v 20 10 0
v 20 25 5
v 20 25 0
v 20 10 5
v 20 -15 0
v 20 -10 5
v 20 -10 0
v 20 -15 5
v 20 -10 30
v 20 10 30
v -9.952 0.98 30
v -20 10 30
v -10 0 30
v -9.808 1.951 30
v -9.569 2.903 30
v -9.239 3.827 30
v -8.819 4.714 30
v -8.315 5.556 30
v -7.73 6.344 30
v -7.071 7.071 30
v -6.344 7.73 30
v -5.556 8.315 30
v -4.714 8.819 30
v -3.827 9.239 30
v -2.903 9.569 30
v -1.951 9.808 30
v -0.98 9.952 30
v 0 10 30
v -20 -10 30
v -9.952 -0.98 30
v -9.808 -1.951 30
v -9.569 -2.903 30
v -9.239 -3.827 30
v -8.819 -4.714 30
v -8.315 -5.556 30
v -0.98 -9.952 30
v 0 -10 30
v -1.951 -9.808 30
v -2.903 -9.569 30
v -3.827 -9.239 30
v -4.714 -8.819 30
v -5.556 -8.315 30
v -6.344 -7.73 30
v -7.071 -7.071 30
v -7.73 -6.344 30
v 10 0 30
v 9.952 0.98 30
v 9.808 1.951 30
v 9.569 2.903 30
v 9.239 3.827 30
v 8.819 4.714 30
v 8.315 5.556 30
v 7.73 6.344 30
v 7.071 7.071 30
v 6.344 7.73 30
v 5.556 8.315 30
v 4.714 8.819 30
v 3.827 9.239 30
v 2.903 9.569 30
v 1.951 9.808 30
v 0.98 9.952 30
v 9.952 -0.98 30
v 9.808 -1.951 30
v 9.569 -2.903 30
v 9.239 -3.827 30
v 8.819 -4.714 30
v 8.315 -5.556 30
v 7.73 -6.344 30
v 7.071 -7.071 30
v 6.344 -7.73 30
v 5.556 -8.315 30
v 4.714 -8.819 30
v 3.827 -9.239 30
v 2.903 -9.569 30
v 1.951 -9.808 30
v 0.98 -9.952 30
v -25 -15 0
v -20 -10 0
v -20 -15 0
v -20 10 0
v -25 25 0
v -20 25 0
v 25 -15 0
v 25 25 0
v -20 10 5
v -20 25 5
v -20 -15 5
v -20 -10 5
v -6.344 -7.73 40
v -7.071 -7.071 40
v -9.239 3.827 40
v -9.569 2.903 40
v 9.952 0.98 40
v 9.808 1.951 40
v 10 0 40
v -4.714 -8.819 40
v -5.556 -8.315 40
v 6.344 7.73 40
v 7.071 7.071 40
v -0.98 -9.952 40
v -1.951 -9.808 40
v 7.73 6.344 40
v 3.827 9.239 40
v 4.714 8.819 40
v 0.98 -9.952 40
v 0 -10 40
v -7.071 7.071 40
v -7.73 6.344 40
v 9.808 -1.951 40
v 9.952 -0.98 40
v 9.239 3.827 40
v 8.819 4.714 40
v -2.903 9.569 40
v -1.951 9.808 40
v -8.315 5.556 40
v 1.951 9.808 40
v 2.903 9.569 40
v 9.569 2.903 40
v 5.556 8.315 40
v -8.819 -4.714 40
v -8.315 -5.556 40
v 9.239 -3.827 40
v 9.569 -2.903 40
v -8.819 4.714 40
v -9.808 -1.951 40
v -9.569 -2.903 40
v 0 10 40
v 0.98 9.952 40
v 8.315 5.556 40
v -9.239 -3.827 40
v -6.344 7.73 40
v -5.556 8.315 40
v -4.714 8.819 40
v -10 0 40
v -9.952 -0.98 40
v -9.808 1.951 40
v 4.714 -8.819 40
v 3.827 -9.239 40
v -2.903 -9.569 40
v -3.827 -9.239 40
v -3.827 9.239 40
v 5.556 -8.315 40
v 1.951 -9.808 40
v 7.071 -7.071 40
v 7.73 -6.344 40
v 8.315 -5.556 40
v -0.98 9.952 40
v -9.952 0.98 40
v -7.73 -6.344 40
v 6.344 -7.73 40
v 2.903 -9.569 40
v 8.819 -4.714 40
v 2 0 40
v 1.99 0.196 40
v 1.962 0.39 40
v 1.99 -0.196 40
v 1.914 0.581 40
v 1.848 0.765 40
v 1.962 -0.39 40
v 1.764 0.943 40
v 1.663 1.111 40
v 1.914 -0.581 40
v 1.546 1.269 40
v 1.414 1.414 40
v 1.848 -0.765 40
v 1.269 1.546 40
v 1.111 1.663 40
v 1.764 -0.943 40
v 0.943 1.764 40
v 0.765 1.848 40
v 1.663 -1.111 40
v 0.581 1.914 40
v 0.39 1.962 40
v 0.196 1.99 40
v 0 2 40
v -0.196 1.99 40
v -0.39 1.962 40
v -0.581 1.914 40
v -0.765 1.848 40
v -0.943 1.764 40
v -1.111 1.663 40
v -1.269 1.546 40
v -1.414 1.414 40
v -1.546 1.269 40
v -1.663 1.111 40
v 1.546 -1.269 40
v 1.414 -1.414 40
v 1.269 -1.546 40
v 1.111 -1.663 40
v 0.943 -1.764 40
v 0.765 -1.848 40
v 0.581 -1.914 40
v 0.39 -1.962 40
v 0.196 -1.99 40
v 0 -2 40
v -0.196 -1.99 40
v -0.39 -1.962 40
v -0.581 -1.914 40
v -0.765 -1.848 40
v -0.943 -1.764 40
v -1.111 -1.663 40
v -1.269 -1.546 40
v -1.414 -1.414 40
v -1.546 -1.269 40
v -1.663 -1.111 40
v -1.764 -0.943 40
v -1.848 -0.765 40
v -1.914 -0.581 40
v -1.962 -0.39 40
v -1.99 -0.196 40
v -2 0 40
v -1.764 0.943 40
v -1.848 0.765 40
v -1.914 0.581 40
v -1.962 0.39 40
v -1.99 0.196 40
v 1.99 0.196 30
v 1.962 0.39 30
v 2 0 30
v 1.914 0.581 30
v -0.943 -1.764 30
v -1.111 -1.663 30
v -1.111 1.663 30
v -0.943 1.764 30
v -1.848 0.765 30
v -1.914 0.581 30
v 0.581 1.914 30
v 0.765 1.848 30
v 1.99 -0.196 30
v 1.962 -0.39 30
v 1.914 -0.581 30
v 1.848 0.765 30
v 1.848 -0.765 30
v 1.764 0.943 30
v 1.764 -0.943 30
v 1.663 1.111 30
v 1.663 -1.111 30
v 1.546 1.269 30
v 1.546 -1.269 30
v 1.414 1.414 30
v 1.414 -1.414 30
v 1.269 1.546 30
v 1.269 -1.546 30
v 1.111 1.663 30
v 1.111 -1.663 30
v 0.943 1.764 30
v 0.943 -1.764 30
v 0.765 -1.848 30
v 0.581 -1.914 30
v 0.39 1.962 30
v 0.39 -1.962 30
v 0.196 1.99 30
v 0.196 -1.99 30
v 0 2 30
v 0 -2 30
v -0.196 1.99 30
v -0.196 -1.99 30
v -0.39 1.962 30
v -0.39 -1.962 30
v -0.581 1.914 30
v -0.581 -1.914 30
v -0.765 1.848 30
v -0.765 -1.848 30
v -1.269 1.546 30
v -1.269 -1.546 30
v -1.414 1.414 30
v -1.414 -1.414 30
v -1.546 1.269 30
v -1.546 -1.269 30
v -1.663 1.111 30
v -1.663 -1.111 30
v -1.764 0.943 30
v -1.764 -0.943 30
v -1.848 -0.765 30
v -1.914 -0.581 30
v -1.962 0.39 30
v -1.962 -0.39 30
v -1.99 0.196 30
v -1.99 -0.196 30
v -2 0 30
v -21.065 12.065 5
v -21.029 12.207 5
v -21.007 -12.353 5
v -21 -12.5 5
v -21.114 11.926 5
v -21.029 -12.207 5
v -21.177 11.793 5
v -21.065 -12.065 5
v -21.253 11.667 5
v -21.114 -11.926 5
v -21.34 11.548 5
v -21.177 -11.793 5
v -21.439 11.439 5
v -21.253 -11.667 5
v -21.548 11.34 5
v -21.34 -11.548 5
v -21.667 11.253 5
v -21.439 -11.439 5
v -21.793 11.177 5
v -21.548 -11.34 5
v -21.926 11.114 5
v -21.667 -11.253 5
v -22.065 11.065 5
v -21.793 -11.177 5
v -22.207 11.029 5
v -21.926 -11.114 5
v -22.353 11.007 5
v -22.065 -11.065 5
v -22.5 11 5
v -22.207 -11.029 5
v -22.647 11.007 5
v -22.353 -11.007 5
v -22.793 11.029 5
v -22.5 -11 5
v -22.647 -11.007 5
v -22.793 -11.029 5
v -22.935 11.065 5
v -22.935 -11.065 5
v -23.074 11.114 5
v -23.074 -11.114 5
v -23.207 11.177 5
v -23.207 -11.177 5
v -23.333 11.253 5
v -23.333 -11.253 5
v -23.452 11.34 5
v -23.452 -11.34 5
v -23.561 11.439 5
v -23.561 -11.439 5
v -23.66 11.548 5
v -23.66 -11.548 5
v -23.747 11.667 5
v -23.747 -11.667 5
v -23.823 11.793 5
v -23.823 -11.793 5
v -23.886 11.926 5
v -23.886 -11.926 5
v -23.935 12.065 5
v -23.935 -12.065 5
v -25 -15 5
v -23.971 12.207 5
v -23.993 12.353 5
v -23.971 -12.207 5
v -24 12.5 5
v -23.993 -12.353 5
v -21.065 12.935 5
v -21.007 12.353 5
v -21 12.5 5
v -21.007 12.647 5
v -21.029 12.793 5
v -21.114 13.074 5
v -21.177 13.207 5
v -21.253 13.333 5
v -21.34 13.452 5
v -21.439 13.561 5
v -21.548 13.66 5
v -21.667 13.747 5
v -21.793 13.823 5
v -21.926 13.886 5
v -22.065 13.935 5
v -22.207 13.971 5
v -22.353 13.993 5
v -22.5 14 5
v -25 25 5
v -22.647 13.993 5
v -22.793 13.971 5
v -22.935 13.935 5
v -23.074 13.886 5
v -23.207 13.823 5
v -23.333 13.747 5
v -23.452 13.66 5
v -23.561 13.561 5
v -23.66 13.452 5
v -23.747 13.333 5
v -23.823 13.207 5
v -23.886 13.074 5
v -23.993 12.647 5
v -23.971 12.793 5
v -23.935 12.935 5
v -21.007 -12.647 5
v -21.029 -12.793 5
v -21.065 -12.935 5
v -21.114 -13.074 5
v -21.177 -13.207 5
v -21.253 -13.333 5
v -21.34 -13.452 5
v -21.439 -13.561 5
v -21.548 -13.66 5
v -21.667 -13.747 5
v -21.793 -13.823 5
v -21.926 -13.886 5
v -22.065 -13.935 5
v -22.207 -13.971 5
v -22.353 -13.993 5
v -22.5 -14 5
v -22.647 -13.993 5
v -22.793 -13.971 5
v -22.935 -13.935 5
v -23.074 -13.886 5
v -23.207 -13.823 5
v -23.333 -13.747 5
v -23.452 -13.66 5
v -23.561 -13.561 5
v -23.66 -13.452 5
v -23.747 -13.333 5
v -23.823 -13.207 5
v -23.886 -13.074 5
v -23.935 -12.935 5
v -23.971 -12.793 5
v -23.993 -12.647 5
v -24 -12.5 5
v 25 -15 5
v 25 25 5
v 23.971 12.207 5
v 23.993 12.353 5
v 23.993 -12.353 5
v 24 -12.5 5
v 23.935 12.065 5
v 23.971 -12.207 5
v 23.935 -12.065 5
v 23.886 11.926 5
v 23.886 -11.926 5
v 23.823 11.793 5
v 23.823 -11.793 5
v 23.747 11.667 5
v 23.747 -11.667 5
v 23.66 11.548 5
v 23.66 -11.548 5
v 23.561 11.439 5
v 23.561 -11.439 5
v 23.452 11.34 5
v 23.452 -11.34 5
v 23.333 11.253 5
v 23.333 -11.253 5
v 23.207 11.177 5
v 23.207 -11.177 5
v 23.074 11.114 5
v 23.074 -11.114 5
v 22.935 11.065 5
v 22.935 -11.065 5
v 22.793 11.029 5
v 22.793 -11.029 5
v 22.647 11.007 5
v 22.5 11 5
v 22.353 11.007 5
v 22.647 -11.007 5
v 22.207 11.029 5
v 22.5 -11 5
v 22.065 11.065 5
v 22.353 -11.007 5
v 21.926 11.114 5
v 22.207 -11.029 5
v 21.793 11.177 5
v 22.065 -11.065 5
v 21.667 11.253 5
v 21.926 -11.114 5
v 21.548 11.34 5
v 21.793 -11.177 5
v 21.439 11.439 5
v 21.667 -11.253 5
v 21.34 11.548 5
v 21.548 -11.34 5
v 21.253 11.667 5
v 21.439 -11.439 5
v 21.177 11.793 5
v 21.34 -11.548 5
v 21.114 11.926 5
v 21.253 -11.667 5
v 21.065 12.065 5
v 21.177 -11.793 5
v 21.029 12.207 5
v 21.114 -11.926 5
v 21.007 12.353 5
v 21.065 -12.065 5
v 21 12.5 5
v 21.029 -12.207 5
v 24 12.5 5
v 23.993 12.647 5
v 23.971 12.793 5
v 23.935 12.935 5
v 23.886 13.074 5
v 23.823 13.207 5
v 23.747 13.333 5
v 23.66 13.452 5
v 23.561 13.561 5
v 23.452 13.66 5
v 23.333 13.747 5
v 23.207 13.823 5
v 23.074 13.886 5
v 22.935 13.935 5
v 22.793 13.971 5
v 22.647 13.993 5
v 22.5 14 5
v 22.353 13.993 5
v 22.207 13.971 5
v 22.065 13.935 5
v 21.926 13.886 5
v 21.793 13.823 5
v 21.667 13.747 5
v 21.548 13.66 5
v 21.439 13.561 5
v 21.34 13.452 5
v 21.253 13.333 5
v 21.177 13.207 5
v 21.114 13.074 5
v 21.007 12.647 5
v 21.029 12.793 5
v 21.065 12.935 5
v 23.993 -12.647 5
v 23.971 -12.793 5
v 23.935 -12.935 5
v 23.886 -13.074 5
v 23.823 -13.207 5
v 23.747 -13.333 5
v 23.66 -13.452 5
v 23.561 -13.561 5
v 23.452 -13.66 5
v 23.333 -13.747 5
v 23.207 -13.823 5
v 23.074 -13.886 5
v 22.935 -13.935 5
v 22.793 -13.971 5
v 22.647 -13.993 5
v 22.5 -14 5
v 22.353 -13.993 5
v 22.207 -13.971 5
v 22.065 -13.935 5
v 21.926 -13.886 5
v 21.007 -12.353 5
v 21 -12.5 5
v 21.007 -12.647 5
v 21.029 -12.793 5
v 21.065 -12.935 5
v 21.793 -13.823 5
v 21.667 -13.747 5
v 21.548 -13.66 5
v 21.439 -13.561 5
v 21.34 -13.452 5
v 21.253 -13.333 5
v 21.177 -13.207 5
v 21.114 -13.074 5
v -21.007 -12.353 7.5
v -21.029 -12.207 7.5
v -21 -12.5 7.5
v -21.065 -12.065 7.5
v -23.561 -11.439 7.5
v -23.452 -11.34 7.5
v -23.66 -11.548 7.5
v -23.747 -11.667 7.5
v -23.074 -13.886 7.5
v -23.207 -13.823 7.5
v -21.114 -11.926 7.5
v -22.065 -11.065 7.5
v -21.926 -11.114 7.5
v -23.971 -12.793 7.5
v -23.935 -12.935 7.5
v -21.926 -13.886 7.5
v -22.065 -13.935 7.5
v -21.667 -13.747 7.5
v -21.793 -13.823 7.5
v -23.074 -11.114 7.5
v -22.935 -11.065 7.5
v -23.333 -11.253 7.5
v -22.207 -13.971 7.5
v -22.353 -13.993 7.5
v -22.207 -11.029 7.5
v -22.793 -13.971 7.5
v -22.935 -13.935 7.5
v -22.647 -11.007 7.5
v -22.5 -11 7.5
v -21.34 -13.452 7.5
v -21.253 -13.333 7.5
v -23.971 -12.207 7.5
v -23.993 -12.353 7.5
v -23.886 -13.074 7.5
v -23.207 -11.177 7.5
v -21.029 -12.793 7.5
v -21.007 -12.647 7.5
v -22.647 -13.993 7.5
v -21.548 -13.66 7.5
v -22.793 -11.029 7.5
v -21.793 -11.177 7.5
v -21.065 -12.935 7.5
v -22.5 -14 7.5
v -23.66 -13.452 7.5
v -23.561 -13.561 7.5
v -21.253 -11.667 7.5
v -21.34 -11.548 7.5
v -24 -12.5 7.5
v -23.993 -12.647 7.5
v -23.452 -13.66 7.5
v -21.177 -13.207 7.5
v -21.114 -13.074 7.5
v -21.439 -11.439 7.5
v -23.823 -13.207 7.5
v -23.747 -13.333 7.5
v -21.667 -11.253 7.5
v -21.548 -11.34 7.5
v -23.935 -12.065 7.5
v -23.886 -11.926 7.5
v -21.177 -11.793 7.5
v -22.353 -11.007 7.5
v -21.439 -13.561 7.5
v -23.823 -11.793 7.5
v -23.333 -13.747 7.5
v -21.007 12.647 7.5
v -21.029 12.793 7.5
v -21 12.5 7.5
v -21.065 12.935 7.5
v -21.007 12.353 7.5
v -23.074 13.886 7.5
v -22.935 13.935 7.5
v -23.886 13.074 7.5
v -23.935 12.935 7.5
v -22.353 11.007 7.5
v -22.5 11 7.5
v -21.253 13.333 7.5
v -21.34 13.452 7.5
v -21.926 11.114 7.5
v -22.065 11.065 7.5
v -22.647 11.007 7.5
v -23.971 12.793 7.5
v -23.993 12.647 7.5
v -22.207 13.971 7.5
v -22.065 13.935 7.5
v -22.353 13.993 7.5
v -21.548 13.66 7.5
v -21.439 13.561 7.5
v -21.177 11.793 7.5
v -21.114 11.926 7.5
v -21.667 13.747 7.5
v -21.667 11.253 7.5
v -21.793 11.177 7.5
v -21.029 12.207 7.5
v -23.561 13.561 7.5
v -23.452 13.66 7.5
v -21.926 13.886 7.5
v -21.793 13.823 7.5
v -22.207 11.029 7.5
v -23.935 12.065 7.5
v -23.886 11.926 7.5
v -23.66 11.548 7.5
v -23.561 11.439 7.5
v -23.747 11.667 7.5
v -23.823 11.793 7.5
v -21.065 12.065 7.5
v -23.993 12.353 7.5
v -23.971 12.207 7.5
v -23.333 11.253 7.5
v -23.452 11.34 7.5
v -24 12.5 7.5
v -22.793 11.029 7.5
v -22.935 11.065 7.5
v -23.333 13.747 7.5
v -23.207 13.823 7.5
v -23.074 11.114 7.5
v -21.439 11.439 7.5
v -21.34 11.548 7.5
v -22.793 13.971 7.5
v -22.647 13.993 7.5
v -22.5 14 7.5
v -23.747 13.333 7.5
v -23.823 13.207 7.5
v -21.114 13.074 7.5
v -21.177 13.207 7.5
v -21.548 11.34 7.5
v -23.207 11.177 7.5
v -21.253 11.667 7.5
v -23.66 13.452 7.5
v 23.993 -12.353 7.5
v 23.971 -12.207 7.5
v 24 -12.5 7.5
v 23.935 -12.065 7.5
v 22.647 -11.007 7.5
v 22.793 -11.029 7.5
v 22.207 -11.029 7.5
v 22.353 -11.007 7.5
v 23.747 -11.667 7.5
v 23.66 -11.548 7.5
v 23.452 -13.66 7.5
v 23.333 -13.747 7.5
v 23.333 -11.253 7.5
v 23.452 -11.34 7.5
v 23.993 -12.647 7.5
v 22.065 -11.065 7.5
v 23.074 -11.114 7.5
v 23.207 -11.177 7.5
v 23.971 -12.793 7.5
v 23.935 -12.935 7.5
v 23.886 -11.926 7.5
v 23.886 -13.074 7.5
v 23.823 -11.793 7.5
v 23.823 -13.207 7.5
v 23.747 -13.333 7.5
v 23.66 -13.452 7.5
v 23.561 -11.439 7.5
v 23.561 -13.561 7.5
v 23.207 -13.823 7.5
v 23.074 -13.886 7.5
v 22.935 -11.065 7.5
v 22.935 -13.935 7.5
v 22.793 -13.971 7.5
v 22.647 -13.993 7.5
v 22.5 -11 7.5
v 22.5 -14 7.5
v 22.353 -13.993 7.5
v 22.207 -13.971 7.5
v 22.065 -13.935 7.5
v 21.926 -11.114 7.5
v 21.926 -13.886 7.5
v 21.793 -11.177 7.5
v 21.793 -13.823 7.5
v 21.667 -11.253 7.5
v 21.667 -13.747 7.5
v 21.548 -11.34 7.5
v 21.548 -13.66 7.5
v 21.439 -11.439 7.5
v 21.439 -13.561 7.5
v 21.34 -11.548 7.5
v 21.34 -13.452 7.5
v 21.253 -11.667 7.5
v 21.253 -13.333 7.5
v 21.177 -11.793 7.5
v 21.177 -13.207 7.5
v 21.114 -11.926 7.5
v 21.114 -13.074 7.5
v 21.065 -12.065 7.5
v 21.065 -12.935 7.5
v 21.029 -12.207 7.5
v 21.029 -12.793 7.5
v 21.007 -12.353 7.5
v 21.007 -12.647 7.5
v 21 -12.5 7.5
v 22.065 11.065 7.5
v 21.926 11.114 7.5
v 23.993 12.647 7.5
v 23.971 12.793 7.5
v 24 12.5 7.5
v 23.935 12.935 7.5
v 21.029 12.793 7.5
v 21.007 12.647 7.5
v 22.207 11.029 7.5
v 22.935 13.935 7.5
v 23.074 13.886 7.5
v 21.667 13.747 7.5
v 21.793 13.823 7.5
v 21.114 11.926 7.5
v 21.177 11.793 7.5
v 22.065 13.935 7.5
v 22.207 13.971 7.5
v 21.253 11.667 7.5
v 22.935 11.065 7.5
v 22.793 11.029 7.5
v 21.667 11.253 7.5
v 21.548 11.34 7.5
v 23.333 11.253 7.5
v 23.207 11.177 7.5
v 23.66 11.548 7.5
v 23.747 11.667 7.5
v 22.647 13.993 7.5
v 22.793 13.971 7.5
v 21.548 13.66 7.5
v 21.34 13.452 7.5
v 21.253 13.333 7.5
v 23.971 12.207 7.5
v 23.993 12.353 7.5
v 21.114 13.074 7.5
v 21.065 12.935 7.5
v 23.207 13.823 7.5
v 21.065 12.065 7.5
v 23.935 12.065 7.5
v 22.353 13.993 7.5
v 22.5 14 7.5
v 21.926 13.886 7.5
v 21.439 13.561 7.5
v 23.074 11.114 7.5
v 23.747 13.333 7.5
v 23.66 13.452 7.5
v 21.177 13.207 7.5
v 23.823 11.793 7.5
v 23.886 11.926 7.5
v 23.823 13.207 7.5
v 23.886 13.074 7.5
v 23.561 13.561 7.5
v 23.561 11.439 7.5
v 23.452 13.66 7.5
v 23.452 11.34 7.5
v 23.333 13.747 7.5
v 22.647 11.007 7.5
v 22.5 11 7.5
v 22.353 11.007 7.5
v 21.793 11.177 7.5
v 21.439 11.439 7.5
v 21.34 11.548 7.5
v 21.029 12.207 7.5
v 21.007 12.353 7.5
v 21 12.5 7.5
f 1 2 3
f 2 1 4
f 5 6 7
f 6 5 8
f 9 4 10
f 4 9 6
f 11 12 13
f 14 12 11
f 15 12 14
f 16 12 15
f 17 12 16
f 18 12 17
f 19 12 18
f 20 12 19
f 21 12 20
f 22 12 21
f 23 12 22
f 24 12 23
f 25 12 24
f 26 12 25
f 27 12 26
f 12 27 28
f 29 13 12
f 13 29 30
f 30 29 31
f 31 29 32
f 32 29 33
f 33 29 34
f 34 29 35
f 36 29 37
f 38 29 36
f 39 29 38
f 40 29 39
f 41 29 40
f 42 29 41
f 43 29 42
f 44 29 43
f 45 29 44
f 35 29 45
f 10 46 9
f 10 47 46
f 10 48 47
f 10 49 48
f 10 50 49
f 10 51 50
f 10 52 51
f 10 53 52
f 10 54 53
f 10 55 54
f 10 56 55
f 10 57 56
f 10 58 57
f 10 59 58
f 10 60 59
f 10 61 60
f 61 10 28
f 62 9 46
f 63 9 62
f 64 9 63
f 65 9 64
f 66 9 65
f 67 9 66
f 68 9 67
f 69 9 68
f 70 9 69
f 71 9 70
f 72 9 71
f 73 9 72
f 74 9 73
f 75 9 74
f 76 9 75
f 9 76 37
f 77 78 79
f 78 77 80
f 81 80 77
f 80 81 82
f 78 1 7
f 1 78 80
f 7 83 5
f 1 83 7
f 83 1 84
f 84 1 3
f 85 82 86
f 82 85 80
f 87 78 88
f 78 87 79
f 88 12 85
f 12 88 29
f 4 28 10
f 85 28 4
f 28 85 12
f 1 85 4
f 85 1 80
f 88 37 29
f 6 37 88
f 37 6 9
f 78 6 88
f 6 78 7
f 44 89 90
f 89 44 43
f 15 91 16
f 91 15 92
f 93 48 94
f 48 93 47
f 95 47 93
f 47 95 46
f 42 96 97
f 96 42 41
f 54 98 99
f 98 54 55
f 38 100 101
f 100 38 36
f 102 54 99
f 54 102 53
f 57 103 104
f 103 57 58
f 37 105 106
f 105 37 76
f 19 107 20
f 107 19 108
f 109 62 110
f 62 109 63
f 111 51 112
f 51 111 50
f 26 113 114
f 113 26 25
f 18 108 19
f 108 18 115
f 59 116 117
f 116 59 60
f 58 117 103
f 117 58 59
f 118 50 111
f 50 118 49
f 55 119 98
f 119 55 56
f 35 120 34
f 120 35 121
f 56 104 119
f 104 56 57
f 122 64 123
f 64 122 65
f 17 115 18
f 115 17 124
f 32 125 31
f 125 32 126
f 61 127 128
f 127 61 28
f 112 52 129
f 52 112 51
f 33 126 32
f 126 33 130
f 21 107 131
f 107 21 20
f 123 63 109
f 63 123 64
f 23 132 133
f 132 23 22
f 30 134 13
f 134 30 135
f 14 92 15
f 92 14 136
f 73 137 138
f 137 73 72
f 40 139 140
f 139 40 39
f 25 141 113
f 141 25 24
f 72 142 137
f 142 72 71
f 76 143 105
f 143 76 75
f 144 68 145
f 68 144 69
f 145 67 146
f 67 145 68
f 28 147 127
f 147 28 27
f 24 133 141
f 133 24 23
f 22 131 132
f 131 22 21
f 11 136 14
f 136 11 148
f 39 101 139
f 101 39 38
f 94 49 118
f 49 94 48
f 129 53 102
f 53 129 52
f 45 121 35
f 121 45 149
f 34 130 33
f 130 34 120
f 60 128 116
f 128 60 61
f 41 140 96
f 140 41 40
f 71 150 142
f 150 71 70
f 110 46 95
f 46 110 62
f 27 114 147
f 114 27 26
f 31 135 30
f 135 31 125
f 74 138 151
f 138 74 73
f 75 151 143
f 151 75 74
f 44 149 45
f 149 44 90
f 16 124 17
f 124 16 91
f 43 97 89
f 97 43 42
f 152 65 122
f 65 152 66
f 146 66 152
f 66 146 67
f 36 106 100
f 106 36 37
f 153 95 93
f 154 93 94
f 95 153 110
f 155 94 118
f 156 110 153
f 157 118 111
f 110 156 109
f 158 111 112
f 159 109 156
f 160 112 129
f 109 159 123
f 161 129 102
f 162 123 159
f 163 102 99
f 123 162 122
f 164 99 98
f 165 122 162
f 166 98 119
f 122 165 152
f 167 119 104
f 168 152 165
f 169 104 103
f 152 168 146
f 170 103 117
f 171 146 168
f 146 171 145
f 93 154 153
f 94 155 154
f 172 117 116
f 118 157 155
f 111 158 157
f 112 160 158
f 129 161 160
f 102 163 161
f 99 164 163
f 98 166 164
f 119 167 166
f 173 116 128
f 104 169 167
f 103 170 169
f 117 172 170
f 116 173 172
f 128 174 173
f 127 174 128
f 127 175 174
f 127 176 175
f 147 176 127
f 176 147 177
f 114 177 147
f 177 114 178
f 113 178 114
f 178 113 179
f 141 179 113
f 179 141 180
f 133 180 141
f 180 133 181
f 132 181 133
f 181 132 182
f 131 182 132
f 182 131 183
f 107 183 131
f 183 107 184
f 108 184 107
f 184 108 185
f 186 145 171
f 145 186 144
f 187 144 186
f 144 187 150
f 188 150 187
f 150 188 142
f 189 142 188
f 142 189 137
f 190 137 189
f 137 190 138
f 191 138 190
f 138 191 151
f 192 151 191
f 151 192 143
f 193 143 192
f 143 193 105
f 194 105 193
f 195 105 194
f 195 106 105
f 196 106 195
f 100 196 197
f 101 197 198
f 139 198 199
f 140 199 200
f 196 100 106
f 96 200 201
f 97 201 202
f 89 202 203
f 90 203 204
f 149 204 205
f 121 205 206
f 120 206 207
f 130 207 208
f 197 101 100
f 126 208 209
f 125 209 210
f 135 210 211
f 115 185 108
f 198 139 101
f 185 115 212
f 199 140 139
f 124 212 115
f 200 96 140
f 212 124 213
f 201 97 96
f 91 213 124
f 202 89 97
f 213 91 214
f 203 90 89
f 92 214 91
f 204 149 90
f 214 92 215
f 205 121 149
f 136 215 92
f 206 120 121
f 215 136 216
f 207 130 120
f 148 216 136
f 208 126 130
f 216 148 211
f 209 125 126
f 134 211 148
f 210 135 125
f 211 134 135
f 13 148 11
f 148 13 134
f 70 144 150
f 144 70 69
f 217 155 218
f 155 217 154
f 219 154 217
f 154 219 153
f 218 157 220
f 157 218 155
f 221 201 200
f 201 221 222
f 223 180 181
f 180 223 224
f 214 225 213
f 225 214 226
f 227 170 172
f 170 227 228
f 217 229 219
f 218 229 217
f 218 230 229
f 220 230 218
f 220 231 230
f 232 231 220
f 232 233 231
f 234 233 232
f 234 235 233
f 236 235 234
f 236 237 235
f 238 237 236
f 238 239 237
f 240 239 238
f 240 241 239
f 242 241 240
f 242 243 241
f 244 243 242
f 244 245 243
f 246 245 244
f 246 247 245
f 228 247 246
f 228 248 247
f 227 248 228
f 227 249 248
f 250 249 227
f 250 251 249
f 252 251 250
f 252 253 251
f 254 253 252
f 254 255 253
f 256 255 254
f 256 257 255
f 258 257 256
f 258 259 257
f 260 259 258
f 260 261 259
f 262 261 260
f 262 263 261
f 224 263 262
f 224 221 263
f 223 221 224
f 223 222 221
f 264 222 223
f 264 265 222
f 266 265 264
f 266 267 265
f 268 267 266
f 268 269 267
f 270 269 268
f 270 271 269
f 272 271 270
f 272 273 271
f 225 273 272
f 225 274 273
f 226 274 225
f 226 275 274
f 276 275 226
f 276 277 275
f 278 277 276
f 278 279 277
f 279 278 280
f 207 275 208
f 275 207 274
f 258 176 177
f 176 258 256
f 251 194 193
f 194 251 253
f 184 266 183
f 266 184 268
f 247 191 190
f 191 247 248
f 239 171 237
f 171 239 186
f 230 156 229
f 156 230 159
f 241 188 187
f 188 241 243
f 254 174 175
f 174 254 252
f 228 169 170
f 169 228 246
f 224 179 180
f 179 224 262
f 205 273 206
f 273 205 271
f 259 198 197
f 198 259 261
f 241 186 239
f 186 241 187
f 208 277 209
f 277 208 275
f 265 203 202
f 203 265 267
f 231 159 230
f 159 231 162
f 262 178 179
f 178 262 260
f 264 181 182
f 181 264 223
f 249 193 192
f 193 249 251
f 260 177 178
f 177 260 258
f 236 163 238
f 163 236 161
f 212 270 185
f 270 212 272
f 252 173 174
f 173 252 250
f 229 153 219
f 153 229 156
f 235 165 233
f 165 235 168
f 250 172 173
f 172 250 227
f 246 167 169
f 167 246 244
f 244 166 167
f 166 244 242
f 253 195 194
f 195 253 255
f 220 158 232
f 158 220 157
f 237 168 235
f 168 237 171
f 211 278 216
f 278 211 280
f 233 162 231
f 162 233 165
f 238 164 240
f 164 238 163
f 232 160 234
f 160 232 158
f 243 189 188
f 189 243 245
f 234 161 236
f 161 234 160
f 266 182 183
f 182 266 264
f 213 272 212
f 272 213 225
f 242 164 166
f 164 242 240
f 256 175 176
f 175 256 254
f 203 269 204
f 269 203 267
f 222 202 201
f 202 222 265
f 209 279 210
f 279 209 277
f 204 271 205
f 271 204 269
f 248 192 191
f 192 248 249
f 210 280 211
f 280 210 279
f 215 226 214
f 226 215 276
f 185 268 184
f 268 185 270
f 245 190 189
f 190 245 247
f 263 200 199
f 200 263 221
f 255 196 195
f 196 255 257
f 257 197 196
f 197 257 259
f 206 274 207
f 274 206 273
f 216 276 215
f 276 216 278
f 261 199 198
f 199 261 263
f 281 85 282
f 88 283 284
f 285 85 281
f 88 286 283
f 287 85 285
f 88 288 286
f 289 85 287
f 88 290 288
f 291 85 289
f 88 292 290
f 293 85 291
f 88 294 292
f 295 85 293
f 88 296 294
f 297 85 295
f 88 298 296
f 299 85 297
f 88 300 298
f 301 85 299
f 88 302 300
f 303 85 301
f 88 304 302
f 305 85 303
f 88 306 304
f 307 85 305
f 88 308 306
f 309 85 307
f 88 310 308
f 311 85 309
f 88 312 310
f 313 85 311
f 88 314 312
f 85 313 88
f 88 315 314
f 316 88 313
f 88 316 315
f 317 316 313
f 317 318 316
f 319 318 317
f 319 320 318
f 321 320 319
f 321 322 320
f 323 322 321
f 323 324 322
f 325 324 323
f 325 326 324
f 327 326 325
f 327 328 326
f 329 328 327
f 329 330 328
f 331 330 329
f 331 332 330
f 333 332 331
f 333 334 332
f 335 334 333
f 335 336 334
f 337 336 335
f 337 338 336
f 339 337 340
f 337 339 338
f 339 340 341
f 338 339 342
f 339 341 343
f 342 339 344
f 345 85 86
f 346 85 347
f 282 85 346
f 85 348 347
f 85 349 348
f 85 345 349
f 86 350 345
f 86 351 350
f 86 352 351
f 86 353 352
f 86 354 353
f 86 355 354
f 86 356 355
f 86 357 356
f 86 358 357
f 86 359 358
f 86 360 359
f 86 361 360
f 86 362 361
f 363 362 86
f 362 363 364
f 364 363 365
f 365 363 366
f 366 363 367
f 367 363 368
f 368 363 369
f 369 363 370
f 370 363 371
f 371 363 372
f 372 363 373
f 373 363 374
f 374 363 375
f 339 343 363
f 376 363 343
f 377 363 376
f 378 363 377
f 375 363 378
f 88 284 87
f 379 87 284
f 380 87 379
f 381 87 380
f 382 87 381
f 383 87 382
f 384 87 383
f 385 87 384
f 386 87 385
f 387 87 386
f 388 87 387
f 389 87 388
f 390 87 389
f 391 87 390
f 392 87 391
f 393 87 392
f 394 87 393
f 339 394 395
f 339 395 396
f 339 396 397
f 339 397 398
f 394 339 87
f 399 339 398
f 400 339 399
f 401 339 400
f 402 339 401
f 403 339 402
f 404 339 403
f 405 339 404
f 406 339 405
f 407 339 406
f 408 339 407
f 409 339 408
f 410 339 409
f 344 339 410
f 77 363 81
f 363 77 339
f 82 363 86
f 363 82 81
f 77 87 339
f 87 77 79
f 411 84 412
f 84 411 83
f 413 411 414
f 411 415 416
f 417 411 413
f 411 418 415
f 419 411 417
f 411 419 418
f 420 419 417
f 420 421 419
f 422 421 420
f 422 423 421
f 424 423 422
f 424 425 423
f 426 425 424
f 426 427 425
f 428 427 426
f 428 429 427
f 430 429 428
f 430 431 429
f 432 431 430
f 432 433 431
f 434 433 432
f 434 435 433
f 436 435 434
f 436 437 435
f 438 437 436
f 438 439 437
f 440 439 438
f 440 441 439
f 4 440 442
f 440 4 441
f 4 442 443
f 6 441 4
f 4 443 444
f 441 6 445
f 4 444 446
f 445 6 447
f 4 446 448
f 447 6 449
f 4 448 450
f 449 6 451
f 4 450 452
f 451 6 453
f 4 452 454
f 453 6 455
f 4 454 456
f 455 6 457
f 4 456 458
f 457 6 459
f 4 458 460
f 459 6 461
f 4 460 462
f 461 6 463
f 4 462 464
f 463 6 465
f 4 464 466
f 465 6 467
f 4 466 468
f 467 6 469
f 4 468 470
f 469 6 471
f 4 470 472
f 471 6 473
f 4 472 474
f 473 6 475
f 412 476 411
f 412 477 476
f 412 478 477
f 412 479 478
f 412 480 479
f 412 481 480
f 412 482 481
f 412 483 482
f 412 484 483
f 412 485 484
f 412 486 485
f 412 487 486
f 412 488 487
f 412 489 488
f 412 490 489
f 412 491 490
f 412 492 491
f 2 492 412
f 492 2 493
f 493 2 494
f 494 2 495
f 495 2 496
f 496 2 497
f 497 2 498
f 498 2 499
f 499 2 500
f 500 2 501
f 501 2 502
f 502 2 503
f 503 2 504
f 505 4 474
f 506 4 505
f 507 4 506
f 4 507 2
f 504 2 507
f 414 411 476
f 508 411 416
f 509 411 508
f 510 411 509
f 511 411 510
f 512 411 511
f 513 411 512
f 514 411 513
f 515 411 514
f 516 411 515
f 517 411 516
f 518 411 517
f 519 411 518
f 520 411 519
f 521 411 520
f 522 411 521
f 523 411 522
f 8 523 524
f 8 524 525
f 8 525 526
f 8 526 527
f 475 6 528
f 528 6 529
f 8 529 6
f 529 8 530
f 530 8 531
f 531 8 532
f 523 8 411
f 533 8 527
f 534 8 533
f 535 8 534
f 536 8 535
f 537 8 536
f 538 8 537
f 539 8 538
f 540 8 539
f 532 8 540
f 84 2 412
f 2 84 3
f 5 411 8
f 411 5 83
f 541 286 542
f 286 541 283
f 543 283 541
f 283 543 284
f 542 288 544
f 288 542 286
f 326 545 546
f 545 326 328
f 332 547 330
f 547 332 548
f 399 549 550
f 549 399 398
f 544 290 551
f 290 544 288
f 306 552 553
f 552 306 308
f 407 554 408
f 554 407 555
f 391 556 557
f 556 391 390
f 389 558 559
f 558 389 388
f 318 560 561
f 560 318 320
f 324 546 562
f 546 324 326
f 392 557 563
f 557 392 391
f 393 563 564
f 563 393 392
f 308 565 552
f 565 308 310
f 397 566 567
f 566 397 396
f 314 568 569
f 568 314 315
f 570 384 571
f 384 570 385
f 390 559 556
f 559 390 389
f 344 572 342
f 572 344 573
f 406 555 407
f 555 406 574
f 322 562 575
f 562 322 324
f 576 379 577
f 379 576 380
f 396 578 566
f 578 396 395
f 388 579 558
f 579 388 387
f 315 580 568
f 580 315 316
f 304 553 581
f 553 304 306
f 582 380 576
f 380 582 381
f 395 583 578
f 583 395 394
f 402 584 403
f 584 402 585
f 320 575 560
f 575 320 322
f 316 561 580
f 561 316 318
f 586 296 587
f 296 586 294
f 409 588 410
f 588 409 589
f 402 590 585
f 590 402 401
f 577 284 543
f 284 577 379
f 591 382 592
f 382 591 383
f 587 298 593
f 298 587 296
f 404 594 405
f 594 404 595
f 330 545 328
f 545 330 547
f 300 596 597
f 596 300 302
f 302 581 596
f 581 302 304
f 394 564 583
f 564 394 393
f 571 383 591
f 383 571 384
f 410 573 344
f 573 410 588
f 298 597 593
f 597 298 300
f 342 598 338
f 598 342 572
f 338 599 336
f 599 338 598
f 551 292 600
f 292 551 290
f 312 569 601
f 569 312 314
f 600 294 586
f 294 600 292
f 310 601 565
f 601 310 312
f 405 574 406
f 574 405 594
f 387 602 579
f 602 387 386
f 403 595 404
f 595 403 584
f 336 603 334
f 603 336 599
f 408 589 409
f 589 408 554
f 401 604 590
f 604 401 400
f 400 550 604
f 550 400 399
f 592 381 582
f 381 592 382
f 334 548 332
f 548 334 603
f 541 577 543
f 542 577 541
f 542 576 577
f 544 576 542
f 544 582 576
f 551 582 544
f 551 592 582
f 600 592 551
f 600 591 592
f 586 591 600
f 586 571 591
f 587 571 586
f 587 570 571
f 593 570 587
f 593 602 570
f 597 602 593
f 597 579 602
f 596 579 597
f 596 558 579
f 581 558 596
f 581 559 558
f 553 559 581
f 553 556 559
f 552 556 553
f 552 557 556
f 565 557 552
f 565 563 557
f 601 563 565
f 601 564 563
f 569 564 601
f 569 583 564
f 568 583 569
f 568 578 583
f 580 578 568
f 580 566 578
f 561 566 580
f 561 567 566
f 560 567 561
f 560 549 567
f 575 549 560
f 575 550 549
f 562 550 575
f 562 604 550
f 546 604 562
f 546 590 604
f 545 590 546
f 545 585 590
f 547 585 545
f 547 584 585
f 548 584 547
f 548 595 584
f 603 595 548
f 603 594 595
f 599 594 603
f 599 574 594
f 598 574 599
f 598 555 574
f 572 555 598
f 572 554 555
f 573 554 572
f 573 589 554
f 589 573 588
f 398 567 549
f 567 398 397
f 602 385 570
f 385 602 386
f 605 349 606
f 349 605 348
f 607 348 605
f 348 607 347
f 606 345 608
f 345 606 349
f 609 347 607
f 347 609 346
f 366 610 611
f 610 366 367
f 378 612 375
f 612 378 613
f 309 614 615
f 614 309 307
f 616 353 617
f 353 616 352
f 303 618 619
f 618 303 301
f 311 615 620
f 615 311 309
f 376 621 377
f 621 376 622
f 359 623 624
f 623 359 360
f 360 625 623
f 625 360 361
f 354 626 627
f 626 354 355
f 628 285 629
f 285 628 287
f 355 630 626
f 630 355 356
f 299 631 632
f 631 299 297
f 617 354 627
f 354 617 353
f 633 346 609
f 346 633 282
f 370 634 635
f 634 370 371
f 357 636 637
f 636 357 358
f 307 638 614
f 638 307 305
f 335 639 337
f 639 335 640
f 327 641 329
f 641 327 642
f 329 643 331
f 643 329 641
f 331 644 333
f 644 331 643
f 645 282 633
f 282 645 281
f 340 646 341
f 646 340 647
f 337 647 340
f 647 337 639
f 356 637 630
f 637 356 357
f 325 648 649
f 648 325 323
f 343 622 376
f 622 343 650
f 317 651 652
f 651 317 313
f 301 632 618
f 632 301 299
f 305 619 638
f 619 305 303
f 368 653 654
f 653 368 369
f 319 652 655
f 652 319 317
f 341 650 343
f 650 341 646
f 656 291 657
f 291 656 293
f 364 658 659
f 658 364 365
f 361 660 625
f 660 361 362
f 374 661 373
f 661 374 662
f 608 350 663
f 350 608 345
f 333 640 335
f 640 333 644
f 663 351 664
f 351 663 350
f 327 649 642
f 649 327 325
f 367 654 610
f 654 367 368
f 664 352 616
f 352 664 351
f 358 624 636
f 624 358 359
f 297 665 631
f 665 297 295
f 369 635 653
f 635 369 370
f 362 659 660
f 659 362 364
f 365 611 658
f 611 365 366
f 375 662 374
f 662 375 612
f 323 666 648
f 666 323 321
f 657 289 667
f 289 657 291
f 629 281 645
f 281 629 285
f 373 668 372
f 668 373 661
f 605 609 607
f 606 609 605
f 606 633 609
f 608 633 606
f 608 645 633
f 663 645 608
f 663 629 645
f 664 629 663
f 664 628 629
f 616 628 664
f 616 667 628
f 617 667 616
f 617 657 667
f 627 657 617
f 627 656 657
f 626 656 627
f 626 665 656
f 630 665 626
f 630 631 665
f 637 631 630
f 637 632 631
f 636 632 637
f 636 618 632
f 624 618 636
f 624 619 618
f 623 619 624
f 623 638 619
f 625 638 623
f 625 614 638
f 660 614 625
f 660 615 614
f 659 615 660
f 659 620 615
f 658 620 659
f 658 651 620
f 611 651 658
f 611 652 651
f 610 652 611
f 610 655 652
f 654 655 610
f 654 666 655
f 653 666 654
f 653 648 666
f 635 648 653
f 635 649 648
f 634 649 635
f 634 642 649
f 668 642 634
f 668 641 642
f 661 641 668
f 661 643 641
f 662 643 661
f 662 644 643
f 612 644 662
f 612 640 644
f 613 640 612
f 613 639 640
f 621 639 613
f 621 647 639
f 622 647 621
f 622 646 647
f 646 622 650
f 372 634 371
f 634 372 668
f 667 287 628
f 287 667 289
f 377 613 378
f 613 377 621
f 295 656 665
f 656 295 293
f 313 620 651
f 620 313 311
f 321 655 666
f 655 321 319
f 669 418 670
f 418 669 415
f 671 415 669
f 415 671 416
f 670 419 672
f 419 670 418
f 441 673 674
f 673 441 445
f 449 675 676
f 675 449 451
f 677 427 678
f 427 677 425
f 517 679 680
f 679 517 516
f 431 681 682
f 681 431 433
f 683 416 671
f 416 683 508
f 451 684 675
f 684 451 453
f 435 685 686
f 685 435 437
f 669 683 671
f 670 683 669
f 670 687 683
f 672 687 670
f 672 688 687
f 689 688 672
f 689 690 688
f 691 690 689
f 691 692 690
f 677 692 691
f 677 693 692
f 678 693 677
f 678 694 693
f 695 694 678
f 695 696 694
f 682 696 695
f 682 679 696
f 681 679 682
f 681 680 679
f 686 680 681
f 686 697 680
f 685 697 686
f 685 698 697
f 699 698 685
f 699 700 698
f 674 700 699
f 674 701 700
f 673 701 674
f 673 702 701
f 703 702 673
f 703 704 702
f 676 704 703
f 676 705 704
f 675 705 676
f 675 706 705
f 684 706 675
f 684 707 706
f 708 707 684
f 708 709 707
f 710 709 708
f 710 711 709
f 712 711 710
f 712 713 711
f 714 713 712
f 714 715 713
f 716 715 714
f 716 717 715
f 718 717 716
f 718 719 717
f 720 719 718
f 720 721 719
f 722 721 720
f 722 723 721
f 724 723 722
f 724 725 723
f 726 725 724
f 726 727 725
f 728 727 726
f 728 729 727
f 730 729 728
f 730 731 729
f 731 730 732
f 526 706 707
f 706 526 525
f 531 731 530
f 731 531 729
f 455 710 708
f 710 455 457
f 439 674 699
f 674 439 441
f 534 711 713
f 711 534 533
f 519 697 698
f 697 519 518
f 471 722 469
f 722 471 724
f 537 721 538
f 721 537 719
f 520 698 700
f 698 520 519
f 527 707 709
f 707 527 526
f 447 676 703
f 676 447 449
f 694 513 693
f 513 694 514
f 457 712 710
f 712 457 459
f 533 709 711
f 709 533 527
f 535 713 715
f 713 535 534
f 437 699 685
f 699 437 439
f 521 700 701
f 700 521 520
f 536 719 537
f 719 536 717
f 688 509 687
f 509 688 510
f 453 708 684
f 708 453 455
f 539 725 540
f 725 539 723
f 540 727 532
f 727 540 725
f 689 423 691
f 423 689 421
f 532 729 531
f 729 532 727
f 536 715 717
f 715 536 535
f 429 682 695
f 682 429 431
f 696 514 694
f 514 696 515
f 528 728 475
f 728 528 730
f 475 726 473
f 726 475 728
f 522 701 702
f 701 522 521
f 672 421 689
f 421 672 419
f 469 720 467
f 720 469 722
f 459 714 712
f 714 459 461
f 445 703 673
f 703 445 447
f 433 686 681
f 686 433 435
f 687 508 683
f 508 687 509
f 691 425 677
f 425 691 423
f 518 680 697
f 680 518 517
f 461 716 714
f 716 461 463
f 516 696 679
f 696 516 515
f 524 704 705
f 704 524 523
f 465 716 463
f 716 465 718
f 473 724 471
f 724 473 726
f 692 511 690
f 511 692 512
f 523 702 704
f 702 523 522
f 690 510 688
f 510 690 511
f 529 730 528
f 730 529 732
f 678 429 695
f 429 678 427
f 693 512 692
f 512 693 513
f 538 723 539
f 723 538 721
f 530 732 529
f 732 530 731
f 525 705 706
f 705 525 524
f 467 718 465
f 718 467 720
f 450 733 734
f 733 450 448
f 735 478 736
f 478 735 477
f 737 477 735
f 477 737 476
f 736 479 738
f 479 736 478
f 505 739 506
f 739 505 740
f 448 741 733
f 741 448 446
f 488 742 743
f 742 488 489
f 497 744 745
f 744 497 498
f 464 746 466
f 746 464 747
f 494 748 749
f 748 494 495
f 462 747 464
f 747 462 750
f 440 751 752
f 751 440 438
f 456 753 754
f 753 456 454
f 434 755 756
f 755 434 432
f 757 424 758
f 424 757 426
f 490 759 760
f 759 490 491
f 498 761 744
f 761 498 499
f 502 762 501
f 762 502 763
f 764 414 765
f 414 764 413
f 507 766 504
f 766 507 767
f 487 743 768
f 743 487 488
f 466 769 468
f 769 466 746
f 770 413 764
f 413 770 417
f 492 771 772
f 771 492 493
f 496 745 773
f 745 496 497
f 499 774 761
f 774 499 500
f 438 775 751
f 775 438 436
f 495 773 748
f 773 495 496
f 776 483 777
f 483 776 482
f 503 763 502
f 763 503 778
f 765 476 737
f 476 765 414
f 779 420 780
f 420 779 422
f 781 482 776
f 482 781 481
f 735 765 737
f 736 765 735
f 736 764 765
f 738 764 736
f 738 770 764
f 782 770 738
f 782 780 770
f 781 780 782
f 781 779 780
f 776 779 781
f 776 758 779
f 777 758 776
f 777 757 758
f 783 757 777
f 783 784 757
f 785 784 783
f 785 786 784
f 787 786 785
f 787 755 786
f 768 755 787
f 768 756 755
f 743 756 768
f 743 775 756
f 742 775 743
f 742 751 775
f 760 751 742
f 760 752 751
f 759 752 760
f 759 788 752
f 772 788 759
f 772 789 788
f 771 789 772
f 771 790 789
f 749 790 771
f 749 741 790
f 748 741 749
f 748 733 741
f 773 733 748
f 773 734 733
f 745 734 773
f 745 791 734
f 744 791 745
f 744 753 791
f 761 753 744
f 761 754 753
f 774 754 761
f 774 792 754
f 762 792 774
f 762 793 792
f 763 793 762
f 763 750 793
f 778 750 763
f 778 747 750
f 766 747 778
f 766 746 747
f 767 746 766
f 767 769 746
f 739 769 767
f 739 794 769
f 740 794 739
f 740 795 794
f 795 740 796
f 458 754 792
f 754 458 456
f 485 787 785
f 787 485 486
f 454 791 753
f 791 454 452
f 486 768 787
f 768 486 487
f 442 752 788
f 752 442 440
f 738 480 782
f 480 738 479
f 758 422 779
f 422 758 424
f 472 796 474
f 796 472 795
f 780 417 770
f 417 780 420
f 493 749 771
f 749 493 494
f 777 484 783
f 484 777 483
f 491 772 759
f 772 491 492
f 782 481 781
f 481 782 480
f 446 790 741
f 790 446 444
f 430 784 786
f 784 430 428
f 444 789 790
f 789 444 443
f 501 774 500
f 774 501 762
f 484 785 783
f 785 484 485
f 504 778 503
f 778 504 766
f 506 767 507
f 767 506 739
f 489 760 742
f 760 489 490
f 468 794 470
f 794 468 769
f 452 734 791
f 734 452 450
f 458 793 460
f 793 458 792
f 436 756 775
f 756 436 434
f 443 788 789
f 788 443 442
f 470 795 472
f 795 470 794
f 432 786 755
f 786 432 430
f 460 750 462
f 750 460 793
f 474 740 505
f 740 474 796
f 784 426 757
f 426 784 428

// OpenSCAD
module servo_motor() {
    // Main body of the servo motor
    difference() {
        union() {
            // Main rectangular body
            translate([-20, -10, 0])
                cube([40, 20, 30]);
            // Top cylindrical part
            translate([0, 0, 30])
                cylinder(h=10, r=10, $fn=64);
        }
        // Shaft hole
        translate([0, 0, 30])
            cylinder(h=15, r=2, $fn=64);
    }
    
    // Mounting flanges
    translate([-25, -15, 0])
        cube([5, 40, 5]);
    translate([20, -15, 0])
        cube([5, 40, 5]);
    
    // Mounting holes
    translate([-22.5, -12.5, 2.5])
        cylinder(h=5, r=1.5, $fn=64);
    translate([-22.5, 12.5, 2.5])
        cylinder(h=5, r=1.5, $fn=64);
    translate([22.5, -12.5, 2.5])
        cylinder(h=5, r=1.5, $fn=64);
    translate([22.5, 12.5, 2.5])
        cylinder(h=5, r=1.5, $fn=64);
}

servo_motor();
